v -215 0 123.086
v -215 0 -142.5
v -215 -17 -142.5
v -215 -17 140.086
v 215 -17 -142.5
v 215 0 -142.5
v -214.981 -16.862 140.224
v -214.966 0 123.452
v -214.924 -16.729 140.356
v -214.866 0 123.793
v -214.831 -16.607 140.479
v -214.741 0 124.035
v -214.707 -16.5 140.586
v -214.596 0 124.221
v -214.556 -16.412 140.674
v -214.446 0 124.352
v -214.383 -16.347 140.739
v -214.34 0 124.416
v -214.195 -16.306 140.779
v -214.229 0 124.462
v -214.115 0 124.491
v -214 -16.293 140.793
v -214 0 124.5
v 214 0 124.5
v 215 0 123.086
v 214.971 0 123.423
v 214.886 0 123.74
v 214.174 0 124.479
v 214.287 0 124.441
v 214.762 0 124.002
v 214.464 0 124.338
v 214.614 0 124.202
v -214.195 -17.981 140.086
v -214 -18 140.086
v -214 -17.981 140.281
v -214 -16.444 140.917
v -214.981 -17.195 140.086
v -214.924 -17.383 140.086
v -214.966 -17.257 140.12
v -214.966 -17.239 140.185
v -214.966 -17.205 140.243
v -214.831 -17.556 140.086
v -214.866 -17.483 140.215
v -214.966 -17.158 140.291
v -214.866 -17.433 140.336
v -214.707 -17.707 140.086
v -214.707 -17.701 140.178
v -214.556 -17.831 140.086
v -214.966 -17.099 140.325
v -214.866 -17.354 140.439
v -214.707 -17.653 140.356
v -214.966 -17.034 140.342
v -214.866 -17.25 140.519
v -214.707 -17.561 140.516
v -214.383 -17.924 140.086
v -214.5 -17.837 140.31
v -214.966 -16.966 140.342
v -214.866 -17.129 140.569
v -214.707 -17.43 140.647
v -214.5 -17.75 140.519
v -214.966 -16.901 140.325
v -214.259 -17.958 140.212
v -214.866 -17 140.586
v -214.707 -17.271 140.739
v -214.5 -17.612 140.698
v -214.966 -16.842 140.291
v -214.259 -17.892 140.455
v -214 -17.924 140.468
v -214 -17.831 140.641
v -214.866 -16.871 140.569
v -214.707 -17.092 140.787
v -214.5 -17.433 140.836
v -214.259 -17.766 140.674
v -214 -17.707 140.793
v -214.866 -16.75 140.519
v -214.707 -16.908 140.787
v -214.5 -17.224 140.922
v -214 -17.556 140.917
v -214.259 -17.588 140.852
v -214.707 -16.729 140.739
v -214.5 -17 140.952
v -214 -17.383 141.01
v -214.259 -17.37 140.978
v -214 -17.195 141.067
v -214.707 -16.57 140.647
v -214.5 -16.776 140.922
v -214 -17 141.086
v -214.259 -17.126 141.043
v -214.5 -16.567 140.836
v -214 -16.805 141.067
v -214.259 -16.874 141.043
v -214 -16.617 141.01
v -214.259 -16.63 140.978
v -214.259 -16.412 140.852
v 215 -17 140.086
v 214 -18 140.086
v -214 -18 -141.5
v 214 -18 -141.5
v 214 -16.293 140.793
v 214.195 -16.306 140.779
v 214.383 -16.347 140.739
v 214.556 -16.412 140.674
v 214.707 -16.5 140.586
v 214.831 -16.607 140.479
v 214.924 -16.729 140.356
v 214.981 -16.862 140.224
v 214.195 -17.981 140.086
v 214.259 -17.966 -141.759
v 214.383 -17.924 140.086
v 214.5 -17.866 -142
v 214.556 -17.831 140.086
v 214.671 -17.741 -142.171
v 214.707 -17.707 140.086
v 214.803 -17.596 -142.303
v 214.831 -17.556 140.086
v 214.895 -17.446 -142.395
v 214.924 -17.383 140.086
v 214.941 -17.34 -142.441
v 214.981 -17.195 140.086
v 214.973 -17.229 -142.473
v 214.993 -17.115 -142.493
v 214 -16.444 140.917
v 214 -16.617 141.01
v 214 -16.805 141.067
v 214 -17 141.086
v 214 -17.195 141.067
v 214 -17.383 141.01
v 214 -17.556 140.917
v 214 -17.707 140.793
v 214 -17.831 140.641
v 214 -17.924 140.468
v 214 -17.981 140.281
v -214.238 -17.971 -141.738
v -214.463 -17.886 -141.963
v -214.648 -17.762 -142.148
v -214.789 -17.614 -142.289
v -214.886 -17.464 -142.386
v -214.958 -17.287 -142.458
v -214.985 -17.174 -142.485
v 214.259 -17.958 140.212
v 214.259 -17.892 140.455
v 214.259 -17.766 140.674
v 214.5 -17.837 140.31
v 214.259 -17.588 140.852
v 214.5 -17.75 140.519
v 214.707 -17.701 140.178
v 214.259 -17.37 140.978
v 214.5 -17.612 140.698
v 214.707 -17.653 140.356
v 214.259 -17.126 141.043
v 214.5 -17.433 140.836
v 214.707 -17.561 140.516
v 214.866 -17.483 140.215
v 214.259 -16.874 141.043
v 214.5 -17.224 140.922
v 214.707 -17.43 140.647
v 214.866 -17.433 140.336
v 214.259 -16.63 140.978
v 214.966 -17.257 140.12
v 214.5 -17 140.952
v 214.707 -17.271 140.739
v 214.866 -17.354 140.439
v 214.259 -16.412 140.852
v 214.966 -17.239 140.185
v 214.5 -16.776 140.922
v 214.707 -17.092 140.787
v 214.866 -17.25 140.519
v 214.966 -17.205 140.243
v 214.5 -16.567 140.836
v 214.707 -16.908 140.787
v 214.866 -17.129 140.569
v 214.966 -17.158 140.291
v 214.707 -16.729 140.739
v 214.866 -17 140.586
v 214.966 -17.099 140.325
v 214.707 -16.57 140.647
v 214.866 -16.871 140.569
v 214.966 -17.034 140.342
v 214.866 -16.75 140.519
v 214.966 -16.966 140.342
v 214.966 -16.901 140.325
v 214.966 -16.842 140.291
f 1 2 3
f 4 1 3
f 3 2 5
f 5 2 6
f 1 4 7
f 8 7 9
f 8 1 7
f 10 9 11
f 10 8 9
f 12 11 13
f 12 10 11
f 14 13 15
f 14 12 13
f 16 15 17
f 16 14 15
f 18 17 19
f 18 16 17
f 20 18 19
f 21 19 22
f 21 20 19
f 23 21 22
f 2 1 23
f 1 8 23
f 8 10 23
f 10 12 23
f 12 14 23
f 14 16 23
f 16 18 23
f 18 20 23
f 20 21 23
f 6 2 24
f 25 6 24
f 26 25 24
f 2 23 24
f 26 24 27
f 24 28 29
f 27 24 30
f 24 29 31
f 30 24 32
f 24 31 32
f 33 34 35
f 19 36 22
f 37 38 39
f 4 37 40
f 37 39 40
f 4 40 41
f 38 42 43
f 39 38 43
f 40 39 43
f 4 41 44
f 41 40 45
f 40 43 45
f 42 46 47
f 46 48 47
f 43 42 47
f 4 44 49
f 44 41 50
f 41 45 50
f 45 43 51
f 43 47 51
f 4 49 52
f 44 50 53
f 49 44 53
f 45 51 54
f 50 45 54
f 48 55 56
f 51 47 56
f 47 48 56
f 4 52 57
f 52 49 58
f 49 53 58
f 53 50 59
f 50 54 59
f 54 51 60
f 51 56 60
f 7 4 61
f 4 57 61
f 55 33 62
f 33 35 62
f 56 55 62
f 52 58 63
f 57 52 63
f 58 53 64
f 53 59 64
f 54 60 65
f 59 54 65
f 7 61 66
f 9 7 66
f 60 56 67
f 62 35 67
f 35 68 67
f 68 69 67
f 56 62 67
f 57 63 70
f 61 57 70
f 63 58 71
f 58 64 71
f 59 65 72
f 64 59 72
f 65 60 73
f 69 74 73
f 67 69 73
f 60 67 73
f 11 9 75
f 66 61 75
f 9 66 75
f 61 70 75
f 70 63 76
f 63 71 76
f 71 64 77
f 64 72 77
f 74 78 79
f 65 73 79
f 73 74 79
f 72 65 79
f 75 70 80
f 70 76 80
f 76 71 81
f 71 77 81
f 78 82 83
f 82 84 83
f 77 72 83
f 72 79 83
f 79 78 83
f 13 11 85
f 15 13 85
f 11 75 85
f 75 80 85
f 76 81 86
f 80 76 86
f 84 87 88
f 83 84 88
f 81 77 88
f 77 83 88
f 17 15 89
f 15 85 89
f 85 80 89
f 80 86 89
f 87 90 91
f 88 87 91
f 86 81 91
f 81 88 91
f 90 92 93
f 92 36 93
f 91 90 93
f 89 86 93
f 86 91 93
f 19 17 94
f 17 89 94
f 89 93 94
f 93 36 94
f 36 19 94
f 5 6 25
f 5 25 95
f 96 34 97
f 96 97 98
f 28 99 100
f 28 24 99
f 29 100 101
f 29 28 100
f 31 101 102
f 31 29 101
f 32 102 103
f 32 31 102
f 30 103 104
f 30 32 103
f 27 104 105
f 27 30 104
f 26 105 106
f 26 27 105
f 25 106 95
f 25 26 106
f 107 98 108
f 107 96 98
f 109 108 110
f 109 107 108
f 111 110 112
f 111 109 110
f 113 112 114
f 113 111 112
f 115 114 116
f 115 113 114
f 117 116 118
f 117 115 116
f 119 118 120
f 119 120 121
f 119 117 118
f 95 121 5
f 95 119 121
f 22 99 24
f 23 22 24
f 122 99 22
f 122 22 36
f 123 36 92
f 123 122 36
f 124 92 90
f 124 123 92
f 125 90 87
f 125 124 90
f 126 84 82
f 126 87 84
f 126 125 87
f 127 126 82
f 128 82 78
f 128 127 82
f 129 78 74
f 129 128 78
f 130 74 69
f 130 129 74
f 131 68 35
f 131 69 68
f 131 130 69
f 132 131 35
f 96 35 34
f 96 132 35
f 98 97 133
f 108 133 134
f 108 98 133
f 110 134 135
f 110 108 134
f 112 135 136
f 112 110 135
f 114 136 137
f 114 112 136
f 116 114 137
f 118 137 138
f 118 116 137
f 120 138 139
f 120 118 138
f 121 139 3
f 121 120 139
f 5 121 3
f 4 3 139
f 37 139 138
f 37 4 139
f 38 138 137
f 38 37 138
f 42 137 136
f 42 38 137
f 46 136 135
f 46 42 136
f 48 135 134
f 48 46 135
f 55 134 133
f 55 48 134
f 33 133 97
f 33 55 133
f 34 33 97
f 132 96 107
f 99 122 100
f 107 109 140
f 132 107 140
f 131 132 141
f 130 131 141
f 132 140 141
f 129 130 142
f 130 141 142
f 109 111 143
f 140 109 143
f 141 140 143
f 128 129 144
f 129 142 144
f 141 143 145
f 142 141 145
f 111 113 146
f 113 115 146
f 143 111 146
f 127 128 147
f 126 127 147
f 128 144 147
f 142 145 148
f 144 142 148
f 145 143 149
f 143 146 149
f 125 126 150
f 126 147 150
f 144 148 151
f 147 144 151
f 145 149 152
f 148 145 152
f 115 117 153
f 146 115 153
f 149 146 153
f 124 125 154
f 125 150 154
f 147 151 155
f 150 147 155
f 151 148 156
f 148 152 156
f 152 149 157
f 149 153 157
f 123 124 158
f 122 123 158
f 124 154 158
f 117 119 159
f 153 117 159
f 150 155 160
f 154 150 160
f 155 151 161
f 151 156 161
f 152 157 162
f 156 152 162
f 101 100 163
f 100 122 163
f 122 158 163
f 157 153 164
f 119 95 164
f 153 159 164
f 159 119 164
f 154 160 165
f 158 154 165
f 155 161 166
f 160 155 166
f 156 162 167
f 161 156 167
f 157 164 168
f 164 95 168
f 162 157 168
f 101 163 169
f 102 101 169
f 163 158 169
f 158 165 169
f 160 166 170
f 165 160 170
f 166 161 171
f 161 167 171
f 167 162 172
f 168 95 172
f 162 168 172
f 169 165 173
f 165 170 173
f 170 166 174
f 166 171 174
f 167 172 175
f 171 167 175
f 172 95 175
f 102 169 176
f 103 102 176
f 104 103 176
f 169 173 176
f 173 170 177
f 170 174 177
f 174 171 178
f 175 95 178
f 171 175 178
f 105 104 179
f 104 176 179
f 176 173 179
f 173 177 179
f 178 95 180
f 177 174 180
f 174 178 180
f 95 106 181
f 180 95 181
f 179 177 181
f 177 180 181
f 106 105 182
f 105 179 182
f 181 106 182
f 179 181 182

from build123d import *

# Parameters (mm, degrees)
F0_W     = 430
F0_H     = 285
F1_DEPTH = 18
F3_DEPTH = 438
F4_R     = 1
F5_R     = 1


with BuildPart() as f1:
    # F0 (on Front) → F1 (new body)
    with BuildSketch(Plane.XZ):
        Rectangle(F0_W, F0_H)
    extrude(amount=F1_DEPTH)

    # F2 (on face) → F3 (cut)
    with BuildSketch(Plane.YZ.offset(215)):
        Polygon((0, 142.5), (-18, 142.5), (0, 124.5), align=None)
    extrude(amount=-F3_DEPTH, mode=Mode.SUBTRACT)

    # F4
    f4_edges = [f1.edges().sort_by_distance(p)[0] for p in [
        (0, -18, 142.5),
    ]]
    fillet(f4_edges, radius=F4_R)

    # F5
    f5_edges = [f1.edges().sort_by_distance(p)[0] for p in [
        (-215, -18, -1.207107),
        (0, -18, -142.5),
        (215, -18, -1.207107),
    ]]
    fillet(f5_edges, radius=F5_R)


solid = f1.part
